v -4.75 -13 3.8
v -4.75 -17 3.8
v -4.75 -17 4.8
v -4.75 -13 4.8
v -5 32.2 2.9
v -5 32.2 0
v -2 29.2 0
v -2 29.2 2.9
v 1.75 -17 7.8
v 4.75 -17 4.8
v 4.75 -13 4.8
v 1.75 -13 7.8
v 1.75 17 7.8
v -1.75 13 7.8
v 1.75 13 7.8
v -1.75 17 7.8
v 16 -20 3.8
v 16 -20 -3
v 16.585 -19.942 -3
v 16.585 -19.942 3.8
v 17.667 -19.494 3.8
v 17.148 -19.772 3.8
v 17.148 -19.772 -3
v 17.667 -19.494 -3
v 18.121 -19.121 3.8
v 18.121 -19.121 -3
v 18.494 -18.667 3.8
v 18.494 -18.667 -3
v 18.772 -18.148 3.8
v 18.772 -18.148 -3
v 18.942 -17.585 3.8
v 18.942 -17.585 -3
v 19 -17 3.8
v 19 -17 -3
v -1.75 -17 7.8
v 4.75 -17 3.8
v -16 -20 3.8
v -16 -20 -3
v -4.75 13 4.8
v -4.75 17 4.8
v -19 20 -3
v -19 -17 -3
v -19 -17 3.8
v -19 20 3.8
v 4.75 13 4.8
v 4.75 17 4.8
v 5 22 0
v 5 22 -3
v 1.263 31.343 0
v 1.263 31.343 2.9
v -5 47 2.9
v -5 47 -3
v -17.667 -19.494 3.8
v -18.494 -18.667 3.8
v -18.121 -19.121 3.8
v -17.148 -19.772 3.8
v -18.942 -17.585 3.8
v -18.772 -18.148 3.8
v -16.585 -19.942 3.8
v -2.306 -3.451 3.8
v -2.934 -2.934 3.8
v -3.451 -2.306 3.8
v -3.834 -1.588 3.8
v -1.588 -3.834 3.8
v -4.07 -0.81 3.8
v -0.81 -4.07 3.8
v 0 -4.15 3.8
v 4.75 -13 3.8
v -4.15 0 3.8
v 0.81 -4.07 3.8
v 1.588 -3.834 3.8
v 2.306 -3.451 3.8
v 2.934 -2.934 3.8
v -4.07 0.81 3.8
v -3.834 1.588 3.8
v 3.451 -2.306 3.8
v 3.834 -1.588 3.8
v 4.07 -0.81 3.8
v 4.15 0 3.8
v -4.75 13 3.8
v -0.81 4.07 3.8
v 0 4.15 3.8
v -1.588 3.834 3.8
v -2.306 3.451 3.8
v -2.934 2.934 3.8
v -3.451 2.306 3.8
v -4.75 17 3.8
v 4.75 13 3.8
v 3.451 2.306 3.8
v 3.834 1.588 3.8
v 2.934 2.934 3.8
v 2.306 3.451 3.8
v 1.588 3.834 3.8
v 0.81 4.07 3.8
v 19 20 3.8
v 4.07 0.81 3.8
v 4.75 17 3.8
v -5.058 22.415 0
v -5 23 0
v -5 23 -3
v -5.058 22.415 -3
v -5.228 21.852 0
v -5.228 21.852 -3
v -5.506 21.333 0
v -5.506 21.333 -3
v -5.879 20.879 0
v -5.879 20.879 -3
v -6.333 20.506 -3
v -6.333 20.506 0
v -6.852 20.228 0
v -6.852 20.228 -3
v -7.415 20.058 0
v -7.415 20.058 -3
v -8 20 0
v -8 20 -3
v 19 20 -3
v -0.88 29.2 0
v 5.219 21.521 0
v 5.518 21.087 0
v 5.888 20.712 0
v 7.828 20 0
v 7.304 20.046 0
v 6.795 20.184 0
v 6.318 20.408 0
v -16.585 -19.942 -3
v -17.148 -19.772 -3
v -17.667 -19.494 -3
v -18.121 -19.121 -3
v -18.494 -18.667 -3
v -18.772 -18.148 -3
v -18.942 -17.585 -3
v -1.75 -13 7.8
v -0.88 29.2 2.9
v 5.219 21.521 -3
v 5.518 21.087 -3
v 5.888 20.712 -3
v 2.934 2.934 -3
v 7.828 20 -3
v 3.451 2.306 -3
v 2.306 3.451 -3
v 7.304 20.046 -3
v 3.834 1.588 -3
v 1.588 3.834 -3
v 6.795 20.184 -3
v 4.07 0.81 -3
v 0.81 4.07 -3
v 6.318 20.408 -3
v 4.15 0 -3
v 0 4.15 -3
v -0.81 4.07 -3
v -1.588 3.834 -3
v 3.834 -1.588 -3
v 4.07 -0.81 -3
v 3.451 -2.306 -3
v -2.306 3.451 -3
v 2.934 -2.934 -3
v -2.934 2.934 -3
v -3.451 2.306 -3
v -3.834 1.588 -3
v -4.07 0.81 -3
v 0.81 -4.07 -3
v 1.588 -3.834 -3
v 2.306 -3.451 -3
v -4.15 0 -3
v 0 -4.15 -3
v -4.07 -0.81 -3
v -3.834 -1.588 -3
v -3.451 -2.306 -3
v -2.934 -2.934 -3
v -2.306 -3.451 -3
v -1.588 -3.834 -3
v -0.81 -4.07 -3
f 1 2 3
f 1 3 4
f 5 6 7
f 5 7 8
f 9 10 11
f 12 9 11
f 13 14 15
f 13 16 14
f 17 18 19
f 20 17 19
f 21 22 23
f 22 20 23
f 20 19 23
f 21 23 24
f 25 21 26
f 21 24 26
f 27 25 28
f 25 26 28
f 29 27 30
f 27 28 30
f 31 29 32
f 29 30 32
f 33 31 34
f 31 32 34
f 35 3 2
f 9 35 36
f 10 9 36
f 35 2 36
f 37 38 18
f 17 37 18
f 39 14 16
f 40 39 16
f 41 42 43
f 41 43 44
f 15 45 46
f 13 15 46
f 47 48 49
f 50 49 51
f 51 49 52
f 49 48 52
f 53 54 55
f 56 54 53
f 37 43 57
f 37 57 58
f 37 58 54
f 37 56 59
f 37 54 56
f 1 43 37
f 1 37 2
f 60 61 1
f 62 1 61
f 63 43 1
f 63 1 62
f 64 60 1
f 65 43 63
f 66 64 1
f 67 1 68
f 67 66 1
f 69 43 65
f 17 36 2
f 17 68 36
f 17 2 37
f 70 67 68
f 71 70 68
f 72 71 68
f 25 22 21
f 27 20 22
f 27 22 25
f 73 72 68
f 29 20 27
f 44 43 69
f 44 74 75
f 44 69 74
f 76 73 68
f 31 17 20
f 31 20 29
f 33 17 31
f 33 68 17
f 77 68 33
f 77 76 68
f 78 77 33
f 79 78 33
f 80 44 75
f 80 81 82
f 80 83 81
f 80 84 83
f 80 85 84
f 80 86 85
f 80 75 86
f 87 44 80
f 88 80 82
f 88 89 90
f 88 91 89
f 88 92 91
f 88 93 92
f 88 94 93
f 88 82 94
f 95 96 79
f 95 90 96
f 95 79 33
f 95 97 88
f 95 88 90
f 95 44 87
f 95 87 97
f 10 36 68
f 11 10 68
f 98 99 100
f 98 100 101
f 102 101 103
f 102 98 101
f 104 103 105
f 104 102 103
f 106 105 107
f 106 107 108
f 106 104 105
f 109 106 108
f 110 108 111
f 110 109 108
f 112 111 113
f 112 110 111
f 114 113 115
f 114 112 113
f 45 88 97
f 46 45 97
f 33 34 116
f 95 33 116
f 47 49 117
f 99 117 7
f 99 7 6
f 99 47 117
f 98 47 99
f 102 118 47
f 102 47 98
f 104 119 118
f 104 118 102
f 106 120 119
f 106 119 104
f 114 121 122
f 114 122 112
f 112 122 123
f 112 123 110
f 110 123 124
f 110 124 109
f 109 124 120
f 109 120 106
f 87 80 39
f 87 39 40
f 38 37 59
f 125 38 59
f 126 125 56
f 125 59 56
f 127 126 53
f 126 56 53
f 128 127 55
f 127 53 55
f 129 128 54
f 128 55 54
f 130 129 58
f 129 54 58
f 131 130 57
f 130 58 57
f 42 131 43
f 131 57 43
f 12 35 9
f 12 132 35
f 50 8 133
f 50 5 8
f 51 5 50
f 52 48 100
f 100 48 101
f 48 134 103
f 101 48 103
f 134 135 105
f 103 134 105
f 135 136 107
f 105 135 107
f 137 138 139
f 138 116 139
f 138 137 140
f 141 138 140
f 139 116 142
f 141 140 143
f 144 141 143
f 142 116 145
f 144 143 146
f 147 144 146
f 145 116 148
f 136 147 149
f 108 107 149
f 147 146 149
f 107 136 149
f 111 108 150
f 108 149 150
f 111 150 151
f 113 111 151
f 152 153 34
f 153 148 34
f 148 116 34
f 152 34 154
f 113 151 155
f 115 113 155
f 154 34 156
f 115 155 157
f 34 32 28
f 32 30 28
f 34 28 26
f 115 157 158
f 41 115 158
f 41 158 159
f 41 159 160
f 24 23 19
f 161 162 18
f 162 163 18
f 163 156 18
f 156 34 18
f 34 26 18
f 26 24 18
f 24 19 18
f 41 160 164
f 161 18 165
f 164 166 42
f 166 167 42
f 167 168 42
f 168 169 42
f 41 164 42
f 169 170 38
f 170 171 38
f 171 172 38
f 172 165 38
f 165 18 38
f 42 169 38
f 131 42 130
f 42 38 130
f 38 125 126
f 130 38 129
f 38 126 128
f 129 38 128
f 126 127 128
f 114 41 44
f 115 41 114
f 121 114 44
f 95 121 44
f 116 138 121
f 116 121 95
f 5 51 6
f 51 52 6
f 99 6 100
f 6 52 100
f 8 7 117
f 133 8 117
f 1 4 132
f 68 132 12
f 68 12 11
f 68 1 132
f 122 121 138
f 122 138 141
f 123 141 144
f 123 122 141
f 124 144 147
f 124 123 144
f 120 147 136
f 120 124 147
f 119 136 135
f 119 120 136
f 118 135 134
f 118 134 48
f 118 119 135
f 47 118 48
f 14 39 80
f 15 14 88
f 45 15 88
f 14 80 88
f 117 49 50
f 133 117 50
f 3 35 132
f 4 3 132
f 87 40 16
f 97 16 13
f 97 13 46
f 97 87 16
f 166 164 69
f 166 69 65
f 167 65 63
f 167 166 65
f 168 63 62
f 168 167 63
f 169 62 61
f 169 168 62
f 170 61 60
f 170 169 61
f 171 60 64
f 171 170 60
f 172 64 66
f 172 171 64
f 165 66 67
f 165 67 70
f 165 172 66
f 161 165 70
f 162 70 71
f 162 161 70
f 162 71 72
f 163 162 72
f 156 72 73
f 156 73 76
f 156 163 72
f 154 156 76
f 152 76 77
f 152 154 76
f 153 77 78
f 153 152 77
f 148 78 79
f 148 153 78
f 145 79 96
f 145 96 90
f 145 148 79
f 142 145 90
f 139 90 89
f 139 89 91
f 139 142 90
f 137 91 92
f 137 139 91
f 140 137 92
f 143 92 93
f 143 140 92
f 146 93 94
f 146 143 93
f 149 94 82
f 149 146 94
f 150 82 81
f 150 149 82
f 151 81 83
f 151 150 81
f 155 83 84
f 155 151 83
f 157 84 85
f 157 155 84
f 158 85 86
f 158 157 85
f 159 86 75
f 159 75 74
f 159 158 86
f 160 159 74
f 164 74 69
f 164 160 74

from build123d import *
from OCP.BRepFilletAPI import BRepFilletAPI_MakeChamfer

# Parameters (mm, degrees)
BOSS_EXTRUDE1_DEPTH      = 3.8
BOSS_EXTRUDE1_DEPTH_BACK = 3
SKETCH1_W                = 38
SKETCH1_H                = 40
SKETCH1_R                = 4.15
BOSS_EXTRUDE2_DEPTH      = 3
FILLET1_R                = 3
SKETCH3_W                = 9.5
SKETCH3_H                = 4
BOSS_EXTRUDE3_DEPTH      = 4
BOSS_EXTRUDE4_DEPTH      = 2.9
CHAMFER1_SIZE            = 3
CHAMFER1_SIZE2           = 2.307927774


with BuildPart() as part:
    # Sketch1 → Boss-Extrude1 (new, two sides: drawn at the far end of the back side and taken through both)
    with BuildSketch(Plane.XY.offset(-BOSS_EXTRUDE1_DEPTH_BACK)):
        Rectangle(SKETCH1_W, SKETCH1_H)
        with Locations(Location((0, 0, 0), (0, 0, 180))):
            Circle(SKETCH1_R, mode=Mode.SUBTRACT)
    extrude(amount=BOSS_EXTRUDE1_DEPTH + BOSS_EXTRUDE1_DEPTH_BACK)

    # Sketch2 → Boss-Extrude2 (add)
    with BuildSketch(Plane.XY):
        Polygon((5, 20), (5, 22), (-5, 47), (-5, 20), align=None)
    extrude(amount=-BOSS_EXTRUDE2_DEPTH)

    # Fillet1
    # the kernel refuses this fillet: 3 mm, written as the material it adds along each edge
    with BuildSketch(Plane(origin=(-5, 20, 0), x_dir=(-1, 0, 0), z_dir=(0, 0, -1))) as fillet1_piece_1:
        with BuildLine():
            CenterArc((FILLET1_R, FILLET1_R), FILLET1_R, 180, 90)
            Line((0, FILLET1_R), (0, 0))
            Line((0, 0), (FILLET1_R, 0))
        make_face()
    extrude(amount=3)
    with BuildSketch(Plane(origin=(5, 20, 0), x_dir=(1, 0, 0), z_dir=(0, 0, -1))) as fillet1_piece_2:
        with BuildLine():
            CenterArc((2.828427125, -3), FILLET1_R, 90, 70.528779366)
            Line((0, -2), (0, 0))
            Line((0, 0), (2.828427125, 0))
        make_face()
    extrude(amount=3)
    # the kernel refuses this fillet: 3 mm, written as the material it takes off along each edge
    with BuildSketch(Plane(origin=(19, -20, -10.5), x_dir=(-1, 0, 0), z_dir=(0, 0, 1)), Plane(origin=(-19, -20, 11.3), x_dir=(1, 0, 0), z_dir=(0, 0, -1))) as fillet1_2_piece_1:
        with BuildLine():
            CenterArc((FILLET1_R, -FILLET1_R), FILLET1_R, 90, 90)
            Line((0, -FILLET1_R), (0, 0))
            Line((0, 0), (FILLET1_R, 0))
        make_face()
    extrude(amount=21.8, mode=Mode.SUBTRACT)

    # Sketch3 → Boss-Extrude3 (add)
    with BuildSketch(Plane.XY.offset(3.8)):
        with Locations((0, -15)):
            Rectangle(SKETCH3_W, SKETCH3_H)
        with Locations((0, 15)):
            Rectangle(SKETCH3_W, SKETCH3_H)
    extrude(amount=BOSS_EXTRUDE3_DEPTH)

    # Sketch4 → Boss-Extrude4 (add)
    with BuildSketch(Plane.XY):
        Polygon((-5, 29.2), (2.12, 29.2), (-5, 47), align=None)
    extrude(amount=BOSS_EXTRUDE4_DEPTH)

    # Chamfer1: one chamfer whose edges measure the first distance from different faces: ONE call of the kernel's chamfer builder (chamfer() names one face for all edges)
    chamfer1_edges_1 = [part.edges().sort_by_distance(p)[0] for p in [
        (-5, 29.2, 1.45),
        (4.75, 15, 7.8),
        (-4.75, 15, 7.8),
        (4.75, -15, 7.8),
        (-4.75, -15, 7.8),
    ]]
    chamfer1_edges_2 = [part.edges().sort_by_distance(p)[0] for p in [
        (2.12, 29.2, 1.45),
    ]]
    chamfer1_side_2 = [part.faces().sort_by_distance(p)[0] for p in [
        (-1.44, 29.2, 1.45),
    ]]
    chamfer1 = BRepFilletAPI_MakeChamfer(part.part.solid().wrapped)
    for e in chamfer1_edges_1:
        chamfer1.Add(CHAMFER1_SIZE, e.wrapped)
    for e in chamfer1_edges_2:
        chamfer1.Add(CHAMFER1_SIZE, CHAMFER1_SIZE2, e.wrapped, chamfer1_side_2[0].wrapped)  # the first distance lies on this face
    add(Compound.cast(chamfer1.Shape()), mode=Mode.REPLACE)


solid = part.part
